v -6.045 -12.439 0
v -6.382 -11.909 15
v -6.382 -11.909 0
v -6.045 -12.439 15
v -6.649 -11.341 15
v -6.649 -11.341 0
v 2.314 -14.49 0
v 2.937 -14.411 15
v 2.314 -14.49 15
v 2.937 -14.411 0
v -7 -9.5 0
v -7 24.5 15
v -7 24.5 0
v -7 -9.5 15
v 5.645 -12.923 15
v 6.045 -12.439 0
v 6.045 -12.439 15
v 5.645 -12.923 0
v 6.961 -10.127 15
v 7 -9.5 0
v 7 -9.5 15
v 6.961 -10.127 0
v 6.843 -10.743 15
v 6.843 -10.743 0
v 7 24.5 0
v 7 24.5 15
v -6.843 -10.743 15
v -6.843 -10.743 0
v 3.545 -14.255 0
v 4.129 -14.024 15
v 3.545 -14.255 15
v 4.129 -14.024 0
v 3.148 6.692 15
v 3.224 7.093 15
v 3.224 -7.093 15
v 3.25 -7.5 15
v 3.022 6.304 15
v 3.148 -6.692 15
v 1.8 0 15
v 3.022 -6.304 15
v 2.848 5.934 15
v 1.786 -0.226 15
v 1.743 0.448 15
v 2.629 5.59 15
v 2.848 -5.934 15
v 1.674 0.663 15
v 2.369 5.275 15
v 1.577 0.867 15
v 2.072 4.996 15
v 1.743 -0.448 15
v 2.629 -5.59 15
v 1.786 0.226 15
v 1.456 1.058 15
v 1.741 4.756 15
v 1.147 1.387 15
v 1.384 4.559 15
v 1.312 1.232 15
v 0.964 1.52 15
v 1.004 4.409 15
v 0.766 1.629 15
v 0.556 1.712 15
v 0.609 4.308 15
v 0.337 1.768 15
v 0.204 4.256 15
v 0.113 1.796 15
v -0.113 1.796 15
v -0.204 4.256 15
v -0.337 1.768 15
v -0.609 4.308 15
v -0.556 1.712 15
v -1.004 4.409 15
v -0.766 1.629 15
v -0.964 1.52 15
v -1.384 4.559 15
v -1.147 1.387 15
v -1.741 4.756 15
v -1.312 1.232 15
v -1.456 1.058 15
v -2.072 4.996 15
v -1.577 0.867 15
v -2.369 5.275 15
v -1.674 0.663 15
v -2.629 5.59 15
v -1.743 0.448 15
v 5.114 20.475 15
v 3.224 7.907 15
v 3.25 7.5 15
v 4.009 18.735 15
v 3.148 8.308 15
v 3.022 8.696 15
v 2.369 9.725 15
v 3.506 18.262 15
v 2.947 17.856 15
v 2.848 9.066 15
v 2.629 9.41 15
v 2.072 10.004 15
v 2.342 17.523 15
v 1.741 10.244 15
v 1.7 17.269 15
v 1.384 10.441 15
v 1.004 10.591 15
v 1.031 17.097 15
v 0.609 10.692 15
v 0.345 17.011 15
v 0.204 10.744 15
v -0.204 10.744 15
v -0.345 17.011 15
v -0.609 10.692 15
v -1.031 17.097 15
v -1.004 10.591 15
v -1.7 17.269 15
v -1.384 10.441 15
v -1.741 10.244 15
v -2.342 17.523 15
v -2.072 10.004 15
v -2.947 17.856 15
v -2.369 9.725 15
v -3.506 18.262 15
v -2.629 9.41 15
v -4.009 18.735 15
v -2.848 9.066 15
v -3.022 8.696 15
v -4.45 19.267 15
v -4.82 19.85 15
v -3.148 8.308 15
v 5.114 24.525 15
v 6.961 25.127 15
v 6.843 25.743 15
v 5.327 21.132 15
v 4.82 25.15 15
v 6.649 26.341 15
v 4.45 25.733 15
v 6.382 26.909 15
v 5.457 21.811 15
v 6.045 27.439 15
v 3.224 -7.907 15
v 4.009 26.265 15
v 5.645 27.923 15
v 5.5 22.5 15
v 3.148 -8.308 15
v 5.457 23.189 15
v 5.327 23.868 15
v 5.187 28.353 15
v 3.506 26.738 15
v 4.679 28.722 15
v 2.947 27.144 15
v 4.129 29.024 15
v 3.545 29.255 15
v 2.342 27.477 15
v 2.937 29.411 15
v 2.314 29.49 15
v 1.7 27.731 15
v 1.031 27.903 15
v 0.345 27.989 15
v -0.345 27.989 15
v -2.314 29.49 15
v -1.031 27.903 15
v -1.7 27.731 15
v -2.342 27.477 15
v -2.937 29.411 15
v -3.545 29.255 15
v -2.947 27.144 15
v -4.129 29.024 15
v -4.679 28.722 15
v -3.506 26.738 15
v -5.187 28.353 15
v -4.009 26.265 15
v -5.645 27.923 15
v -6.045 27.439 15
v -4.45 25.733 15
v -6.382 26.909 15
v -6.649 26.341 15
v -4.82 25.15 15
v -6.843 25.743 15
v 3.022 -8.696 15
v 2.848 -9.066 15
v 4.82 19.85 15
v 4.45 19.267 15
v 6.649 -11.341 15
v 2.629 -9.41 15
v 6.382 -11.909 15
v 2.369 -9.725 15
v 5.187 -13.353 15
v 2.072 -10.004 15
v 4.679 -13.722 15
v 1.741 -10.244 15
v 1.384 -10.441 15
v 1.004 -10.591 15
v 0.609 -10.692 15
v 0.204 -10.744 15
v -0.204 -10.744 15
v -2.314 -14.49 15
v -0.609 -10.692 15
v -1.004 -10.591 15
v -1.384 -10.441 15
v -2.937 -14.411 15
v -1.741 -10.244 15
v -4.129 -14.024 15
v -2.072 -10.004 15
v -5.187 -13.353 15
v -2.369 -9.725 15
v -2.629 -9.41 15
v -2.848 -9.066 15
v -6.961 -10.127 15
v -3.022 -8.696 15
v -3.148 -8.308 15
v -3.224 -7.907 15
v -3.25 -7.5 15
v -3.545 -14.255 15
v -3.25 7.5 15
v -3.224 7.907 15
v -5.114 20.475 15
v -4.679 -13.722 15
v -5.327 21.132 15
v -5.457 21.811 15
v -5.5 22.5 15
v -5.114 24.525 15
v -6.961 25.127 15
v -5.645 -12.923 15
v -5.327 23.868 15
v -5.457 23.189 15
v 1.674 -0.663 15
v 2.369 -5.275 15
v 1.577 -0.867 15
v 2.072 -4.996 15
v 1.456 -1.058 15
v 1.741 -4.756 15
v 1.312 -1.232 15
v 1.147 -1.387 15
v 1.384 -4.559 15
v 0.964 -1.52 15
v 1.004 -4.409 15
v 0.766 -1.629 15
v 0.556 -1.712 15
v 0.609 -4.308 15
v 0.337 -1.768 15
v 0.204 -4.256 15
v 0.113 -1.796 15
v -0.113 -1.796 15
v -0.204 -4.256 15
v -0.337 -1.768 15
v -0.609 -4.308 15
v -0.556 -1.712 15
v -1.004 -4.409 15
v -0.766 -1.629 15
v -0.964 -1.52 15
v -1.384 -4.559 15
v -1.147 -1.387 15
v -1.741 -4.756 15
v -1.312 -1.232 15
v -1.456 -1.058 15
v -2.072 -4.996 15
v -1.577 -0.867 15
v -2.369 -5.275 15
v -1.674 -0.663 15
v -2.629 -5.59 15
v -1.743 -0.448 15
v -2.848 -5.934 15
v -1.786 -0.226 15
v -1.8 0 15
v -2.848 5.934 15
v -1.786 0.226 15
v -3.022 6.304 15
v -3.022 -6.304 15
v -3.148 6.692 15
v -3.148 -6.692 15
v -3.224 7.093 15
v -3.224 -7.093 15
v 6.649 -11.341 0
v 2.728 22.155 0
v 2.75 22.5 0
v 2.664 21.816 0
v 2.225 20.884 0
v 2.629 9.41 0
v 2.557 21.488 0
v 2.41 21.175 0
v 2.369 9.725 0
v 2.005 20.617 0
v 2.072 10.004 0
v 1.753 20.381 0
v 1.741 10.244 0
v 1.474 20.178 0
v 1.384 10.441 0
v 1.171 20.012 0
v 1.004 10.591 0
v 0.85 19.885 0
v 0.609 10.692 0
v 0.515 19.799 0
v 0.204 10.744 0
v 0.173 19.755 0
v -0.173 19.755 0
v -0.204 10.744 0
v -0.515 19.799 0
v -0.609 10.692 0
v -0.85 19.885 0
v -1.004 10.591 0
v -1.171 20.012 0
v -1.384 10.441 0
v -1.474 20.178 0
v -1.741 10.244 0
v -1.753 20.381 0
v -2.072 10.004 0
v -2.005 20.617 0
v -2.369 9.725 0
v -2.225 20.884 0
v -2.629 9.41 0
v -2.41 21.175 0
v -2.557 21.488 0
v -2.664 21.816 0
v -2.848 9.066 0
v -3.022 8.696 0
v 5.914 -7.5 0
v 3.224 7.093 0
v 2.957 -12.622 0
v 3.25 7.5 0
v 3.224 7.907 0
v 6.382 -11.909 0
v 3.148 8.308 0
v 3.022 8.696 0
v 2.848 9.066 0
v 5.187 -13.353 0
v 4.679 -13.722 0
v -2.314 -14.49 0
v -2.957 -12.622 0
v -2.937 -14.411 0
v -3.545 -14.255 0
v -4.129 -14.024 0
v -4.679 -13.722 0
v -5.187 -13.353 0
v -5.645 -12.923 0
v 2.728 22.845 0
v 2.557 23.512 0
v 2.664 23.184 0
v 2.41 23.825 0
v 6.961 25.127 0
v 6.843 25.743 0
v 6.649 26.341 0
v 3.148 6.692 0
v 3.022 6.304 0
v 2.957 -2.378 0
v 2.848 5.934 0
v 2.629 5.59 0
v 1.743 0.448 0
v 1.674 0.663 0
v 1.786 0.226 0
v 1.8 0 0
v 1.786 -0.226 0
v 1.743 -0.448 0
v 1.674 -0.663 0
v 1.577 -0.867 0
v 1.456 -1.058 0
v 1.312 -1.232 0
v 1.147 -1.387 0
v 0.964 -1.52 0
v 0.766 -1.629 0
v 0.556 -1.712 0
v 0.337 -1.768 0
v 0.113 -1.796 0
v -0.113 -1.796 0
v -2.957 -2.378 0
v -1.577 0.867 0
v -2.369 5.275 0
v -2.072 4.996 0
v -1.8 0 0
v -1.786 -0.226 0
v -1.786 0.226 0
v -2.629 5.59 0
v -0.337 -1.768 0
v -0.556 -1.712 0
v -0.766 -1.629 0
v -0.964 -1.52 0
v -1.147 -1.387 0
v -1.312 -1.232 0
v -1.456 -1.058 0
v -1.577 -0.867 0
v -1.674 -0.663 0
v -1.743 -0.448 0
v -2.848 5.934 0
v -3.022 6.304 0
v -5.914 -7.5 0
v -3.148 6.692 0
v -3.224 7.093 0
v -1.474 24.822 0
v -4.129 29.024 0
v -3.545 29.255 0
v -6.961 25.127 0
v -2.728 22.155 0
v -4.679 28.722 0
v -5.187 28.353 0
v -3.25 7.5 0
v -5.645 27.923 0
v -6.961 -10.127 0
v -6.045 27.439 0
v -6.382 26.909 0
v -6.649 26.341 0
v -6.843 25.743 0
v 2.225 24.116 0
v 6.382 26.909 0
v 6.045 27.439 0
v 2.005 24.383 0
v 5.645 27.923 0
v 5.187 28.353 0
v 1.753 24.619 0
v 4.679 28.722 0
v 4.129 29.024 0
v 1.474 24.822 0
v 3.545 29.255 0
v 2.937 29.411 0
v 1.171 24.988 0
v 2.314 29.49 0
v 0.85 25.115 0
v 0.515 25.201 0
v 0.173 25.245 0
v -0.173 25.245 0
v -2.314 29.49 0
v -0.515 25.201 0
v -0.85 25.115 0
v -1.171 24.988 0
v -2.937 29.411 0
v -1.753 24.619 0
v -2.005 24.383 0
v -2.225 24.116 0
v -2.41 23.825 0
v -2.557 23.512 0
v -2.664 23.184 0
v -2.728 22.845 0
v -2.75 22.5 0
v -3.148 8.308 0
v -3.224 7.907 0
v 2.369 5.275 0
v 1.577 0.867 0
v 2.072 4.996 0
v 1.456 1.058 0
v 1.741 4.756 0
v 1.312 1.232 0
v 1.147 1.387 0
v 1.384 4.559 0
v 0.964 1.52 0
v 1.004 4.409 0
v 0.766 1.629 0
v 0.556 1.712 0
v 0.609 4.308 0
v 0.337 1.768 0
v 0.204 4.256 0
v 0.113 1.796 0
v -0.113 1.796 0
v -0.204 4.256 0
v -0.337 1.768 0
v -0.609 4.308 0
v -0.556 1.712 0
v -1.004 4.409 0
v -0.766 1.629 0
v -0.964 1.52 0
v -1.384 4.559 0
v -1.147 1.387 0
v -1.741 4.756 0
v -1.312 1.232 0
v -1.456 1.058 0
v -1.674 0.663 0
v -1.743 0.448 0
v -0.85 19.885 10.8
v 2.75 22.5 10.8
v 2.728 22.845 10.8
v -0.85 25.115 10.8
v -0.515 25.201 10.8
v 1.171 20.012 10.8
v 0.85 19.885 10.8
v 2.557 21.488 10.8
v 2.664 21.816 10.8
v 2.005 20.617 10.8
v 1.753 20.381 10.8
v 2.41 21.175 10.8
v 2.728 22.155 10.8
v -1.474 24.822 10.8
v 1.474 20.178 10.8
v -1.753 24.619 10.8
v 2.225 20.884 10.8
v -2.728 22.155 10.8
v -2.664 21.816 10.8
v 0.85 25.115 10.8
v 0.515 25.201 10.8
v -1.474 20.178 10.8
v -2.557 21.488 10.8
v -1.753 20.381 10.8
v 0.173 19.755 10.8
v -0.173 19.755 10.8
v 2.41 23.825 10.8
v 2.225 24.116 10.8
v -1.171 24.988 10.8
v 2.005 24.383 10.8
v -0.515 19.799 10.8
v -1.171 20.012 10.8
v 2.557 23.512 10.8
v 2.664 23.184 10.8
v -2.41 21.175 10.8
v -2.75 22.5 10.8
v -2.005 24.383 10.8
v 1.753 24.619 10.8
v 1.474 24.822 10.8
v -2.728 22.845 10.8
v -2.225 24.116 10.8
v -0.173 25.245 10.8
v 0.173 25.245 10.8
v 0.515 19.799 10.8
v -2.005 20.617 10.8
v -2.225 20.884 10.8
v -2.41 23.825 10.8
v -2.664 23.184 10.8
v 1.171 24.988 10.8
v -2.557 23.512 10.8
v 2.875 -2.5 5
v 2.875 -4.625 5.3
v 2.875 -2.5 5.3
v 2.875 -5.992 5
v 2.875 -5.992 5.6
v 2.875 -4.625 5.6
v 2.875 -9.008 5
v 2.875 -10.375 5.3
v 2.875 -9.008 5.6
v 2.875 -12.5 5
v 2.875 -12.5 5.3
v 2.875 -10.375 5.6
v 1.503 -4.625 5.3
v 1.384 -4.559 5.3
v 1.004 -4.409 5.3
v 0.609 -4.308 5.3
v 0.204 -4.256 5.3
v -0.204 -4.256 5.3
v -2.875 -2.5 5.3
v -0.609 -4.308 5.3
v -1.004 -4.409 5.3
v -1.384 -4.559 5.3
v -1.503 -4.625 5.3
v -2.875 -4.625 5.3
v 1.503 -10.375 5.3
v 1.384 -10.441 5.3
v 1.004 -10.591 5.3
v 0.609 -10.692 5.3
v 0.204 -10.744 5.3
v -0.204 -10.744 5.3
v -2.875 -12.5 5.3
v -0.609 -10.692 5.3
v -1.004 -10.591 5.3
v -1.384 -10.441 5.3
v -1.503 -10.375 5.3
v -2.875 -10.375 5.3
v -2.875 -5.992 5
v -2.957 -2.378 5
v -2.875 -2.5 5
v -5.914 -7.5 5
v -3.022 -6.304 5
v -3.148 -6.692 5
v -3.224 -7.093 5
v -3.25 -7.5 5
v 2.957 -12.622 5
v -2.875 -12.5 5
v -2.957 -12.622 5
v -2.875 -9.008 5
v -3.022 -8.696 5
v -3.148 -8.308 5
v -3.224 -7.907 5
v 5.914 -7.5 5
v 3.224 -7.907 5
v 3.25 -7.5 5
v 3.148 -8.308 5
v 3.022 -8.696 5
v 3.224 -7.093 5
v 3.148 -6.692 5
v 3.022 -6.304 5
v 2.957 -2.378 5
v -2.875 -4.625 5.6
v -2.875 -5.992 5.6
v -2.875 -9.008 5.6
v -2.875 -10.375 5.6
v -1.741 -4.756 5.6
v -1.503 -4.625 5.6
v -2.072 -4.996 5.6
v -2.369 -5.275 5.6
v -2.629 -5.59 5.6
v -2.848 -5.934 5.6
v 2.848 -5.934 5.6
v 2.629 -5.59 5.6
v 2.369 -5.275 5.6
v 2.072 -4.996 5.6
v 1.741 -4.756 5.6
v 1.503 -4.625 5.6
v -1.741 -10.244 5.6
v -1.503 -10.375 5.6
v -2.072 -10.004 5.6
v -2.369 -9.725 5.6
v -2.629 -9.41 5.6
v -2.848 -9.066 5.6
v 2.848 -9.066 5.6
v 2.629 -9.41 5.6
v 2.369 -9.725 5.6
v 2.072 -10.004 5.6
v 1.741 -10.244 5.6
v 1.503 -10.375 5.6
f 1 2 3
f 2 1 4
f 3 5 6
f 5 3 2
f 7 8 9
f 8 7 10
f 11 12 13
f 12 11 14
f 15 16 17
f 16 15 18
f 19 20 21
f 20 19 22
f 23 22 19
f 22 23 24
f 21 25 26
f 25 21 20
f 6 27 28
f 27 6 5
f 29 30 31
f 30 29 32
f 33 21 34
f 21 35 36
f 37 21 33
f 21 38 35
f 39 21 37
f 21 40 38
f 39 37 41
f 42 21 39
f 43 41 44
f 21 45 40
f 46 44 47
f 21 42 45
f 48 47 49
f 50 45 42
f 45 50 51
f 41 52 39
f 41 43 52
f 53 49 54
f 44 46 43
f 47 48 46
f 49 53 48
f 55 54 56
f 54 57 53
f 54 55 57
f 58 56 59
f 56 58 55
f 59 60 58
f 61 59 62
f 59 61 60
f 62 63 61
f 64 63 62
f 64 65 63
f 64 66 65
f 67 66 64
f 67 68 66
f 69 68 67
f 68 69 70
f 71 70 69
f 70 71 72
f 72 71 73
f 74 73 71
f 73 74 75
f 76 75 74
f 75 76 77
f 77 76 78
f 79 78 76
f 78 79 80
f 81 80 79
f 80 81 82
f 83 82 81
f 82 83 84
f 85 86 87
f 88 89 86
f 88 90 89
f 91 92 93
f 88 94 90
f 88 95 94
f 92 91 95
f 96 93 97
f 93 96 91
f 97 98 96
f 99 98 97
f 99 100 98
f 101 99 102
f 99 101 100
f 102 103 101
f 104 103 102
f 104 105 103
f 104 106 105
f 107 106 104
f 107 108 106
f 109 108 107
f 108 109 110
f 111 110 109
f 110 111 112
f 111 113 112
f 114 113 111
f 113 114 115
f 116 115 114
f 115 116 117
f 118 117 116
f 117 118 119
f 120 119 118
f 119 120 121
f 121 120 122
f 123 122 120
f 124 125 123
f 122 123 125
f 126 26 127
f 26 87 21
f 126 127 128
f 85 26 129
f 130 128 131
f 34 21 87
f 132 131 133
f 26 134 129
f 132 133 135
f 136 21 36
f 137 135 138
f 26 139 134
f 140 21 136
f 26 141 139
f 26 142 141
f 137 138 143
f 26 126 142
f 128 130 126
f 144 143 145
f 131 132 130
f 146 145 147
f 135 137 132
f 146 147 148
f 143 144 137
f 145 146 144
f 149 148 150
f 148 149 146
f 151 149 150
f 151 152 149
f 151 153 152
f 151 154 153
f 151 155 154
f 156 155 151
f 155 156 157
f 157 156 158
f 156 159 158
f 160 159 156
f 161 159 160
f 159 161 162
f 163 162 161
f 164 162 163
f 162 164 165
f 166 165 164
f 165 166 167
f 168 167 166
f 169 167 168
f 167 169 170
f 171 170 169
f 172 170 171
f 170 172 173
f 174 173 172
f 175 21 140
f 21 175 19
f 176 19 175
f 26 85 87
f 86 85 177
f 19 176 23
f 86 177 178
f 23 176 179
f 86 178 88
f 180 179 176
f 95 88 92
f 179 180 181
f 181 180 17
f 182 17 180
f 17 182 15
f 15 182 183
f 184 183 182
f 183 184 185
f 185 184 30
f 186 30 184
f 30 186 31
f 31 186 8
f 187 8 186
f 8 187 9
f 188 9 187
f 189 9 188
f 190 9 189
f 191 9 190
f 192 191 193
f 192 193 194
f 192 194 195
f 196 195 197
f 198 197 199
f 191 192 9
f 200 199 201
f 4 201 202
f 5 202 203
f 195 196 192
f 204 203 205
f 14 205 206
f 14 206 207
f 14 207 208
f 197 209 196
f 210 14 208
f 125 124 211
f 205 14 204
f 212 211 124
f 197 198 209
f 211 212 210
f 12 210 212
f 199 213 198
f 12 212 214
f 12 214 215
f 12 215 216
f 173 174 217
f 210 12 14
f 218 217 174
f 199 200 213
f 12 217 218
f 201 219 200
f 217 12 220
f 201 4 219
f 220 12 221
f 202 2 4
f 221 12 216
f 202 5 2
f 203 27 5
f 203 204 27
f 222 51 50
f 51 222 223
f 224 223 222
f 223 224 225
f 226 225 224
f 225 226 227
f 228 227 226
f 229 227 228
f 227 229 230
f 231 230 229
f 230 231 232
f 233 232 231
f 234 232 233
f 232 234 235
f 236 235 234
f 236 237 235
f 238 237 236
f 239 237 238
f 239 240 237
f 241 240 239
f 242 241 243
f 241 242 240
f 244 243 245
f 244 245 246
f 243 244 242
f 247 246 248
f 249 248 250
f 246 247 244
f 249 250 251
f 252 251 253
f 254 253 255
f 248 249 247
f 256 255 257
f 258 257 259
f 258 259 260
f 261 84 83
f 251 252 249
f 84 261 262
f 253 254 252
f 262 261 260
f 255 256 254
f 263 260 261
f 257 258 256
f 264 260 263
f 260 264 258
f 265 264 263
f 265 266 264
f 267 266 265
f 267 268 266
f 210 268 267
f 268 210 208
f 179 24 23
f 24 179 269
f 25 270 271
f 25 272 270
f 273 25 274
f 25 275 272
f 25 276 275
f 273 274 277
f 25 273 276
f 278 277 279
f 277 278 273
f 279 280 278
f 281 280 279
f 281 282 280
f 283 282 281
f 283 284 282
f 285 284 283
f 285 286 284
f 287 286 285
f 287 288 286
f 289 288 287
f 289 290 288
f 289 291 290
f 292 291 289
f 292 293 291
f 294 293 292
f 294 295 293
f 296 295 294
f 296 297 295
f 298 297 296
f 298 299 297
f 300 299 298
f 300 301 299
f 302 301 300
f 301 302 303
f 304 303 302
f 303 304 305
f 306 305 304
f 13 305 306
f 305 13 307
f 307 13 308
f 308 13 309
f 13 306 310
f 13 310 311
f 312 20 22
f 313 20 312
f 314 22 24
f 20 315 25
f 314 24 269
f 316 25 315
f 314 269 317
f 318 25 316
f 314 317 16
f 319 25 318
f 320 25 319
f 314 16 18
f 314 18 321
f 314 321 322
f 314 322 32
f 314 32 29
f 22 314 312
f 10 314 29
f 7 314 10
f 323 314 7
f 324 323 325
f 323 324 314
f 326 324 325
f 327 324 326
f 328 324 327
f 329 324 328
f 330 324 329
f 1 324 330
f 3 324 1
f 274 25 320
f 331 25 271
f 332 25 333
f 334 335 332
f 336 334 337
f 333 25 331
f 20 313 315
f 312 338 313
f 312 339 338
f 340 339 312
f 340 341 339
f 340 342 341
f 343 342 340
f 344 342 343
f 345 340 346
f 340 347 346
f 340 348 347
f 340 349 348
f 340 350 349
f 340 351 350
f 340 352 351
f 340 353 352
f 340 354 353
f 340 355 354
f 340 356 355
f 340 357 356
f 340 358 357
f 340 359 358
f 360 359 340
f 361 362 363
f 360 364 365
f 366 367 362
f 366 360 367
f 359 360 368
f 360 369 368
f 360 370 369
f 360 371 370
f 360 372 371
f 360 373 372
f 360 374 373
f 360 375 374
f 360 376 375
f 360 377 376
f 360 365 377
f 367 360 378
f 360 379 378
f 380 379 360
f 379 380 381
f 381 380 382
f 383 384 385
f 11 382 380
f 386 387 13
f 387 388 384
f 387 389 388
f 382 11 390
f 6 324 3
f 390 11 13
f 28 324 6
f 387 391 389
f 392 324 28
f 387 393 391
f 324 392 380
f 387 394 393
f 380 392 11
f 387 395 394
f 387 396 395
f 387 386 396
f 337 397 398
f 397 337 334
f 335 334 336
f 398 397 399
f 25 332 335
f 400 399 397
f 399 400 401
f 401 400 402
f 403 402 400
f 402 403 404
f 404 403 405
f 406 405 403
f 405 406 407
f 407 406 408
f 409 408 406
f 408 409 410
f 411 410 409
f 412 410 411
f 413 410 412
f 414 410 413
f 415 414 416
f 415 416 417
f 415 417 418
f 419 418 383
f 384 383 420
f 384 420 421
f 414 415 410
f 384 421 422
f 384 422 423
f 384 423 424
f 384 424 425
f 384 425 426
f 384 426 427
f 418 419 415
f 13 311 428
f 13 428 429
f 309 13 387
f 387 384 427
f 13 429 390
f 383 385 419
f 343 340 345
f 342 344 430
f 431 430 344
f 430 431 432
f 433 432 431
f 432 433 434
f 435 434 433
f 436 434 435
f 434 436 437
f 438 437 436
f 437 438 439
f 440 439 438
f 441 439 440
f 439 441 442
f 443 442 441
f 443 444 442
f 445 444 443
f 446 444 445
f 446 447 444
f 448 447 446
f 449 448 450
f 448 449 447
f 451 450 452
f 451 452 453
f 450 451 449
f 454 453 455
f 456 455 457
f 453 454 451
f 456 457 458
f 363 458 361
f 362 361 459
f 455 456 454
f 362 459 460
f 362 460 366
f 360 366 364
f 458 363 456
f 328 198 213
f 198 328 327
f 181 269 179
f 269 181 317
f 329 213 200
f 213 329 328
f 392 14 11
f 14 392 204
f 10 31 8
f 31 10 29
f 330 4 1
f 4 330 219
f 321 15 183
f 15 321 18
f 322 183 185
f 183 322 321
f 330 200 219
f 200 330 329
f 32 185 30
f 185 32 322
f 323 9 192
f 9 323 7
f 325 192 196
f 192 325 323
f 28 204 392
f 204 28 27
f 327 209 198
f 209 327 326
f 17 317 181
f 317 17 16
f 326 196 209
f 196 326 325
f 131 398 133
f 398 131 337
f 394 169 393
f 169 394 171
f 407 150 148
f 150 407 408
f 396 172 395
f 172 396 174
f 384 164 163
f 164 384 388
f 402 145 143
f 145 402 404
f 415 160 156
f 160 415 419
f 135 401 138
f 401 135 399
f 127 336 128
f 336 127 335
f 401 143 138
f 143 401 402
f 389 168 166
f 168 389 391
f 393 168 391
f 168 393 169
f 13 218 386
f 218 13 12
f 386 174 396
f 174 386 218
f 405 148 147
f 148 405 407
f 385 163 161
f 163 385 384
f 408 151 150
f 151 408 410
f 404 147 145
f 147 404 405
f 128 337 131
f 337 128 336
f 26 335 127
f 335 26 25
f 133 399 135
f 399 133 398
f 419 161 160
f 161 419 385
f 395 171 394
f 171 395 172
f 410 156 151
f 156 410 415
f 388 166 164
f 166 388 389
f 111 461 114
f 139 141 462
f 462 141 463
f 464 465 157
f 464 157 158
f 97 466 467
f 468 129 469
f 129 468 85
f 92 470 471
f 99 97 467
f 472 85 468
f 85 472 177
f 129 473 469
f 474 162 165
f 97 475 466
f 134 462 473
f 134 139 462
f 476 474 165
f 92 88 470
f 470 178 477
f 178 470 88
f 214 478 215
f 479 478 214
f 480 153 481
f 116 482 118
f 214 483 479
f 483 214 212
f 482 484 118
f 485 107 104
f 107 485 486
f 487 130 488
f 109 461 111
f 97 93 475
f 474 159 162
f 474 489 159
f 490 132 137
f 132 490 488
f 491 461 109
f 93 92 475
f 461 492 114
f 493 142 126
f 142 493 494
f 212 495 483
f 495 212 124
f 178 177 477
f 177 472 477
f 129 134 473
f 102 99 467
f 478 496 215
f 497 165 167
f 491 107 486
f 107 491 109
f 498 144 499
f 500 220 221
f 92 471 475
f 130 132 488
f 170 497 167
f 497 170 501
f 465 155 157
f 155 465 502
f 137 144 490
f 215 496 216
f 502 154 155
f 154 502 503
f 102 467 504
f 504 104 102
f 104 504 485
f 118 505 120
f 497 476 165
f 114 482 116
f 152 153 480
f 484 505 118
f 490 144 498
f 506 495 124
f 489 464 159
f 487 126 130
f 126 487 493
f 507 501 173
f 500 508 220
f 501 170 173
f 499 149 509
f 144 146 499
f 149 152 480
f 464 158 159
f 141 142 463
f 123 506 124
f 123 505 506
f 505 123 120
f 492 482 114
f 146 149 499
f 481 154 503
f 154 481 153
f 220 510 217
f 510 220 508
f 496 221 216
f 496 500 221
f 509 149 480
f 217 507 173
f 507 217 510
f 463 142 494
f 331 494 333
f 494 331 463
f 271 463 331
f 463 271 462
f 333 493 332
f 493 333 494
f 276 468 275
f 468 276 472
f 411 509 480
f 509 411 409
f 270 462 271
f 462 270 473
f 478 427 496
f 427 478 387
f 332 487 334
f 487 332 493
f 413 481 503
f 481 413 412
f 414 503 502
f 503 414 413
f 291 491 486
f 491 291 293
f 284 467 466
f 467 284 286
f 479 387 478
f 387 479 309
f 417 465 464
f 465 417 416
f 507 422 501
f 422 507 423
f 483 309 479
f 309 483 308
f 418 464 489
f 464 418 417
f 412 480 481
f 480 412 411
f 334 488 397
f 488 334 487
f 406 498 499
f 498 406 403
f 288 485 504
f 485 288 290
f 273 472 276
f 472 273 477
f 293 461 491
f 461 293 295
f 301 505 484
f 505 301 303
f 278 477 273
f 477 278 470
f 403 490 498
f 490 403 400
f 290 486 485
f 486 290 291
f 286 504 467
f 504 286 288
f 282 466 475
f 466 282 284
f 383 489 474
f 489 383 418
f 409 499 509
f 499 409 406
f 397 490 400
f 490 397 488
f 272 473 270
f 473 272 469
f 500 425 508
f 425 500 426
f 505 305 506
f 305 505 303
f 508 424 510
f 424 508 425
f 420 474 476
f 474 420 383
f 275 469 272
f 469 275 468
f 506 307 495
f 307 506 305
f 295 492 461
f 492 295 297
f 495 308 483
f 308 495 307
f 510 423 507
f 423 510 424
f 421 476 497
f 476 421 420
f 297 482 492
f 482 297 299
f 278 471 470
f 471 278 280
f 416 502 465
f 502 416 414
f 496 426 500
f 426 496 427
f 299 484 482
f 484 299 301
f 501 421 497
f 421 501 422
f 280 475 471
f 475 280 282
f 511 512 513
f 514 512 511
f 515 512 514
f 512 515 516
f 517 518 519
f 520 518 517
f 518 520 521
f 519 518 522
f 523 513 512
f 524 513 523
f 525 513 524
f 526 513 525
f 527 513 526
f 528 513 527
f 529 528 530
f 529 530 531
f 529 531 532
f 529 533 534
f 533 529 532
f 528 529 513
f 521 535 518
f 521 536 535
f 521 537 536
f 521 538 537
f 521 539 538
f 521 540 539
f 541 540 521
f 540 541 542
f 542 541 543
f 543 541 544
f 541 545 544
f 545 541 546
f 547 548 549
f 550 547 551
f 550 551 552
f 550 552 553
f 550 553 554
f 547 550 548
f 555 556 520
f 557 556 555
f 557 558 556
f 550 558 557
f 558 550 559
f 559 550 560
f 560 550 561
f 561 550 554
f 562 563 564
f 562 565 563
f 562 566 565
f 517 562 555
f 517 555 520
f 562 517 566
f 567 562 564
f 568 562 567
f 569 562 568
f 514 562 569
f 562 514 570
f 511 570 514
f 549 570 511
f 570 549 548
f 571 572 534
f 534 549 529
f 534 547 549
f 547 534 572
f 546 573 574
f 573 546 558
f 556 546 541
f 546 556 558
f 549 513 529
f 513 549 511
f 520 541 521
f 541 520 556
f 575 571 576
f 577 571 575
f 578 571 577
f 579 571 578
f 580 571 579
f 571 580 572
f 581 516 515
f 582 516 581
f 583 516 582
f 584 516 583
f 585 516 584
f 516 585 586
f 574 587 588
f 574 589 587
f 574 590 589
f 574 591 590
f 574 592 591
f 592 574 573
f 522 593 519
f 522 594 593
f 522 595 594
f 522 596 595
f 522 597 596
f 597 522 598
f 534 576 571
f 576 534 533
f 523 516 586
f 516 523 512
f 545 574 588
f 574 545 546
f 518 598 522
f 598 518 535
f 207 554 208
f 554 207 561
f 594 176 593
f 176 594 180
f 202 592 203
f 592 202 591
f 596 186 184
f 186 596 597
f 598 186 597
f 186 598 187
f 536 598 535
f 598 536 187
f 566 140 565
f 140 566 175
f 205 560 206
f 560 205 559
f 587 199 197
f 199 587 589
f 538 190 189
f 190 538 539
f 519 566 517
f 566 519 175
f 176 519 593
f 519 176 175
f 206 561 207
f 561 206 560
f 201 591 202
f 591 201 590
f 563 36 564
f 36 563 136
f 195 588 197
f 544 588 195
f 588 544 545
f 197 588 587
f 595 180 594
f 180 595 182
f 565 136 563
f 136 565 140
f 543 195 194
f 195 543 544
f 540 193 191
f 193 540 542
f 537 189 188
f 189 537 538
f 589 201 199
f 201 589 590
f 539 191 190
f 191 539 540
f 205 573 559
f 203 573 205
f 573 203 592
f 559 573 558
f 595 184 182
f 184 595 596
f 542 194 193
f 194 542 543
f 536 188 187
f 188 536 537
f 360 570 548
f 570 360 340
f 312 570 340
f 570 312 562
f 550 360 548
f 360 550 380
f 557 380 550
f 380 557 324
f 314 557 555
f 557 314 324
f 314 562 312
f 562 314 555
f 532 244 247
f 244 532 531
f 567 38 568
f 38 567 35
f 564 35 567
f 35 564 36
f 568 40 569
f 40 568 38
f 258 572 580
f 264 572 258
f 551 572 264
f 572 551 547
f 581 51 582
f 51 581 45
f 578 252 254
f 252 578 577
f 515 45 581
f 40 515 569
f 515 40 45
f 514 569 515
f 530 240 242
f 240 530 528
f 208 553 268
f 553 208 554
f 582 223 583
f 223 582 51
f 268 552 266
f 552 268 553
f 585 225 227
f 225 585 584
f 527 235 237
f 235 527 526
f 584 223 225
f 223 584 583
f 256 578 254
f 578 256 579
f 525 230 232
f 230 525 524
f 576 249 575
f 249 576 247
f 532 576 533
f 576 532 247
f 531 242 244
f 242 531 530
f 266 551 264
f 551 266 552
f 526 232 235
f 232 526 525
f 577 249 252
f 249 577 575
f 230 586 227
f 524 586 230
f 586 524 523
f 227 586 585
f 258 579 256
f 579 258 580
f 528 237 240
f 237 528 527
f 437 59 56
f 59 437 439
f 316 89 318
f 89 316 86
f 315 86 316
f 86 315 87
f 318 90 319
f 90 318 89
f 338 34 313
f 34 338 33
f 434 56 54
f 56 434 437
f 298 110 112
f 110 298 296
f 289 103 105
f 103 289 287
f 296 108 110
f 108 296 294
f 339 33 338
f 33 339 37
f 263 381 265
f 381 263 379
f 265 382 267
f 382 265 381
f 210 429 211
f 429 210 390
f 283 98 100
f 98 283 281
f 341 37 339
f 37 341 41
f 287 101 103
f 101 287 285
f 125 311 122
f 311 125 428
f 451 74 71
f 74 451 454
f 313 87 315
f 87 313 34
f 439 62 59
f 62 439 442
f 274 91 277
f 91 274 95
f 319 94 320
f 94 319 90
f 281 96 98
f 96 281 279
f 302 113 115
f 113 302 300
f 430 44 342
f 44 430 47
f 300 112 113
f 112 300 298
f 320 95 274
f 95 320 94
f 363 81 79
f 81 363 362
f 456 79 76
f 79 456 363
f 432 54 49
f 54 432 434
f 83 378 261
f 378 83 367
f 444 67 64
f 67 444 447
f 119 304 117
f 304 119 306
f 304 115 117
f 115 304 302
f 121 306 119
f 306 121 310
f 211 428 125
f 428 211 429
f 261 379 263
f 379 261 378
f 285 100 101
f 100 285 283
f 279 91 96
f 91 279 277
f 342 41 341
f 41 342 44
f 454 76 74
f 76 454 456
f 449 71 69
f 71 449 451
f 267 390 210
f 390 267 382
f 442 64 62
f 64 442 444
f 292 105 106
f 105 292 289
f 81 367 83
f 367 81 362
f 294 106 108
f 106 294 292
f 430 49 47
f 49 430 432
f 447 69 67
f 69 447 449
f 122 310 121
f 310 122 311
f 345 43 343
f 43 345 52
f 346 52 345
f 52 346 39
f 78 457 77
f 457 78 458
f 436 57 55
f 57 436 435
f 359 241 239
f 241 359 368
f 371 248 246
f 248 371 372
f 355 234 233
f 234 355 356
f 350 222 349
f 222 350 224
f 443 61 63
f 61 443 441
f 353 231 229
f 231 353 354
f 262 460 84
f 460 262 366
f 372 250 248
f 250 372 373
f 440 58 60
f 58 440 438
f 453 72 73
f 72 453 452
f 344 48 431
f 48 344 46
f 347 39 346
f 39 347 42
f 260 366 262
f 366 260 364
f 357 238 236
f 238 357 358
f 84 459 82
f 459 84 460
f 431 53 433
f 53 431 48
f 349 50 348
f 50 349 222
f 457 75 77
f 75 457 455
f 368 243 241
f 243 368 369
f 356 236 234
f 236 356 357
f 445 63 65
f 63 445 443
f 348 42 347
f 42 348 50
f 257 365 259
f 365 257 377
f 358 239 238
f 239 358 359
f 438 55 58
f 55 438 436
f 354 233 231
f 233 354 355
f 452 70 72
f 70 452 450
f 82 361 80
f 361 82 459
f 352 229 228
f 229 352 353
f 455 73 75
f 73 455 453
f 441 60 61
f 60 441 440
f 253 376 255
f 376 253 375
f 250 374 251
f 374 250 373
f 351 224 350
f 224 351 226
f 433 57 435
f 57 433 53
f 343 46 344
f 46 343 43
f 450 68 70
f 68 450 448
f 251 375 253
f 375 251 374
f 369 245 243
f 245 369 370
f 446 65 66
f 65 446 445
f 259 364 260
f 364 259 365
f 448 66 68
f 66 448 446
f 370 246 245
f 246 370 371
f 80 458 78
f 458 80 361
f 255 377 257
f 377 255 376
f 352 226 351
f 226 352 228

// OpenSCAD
$fn = 50;


difference() {
	union() {
		hull() {
			translate(v = [-2.0000000000, 9.5000000000, 0]) {
				cylinder(h = 15, r = 5);
			}
			translate(v = [2.0000000000, 9.5000000000, 0]) {
				cylinder(h = 15, r = 5);
			}
			translate(v = [-2.0000000000, -9.5000000000, 0]) {
				cylinder(h = 15, r = 5);
			}
			translate(v = [2.0000000000, -9.5000000000, 0]) {
				cylinder(h = 15, r = 5);
			}
		}
		translate(v = [0.0000000000, 15.0000000000, 0]) {
			hull() {
				translate(v = [-2.0000000000, 9.5000000000, 0]) {
					cylinder(h = 15, r = 5);
				}
				translate(v = [2.0000000000, 9.5000000000, 0]) {
					cylinder(h = 15, r = 5);
				}
				translate(v = [-2.0000000000, -9.5000000000, 0]) {
					cylinder(h = 15, r = 5);
				}
				translate(v = [2.0000000000, -9.5000000000, 0]) {
					cylinder(h = 15, r = 5);
				}
			}
		}
		translate(v = [0.0000000000, 15.0000000000, 0]) {
			hull() {
				translate(v = [-2.0000000000, 9.5000000000, 0]) {
					cylinder(h = 15, r = 5);
				}
				translate(v = [2.0000000000, 9.5000000000, 0]) {
					cylinder(h = 15, r = 5);
				}
				translate(v = [-2.0000000000, -9.5000000000, 0]) {
					cylinder(h = 15, r = 5);
				}
				translate(v = [2.0000000000, -9.5000000000, 0]) {
					cylinder(h = 15, r = 5);
				}
			}
		}
	}
	union() {
		translate(v = [0.0000000000, 22.5000000000, 15]) {
			rotate(a = [0, 0, 0]) {
				difference() {
					union() {
						#translate(v = [0, 0, -15.0000000000]) {
							cylinder(h = 15, r = 2.2500000000);
						}
						#translate(v = [0, 0, -4.2000000000]) {
							cylinder(h = 4.2000000000, r1 = 2.7500000000, r2 = 5.5000000000);
						}
						#translate(v = [0, 0, -15.0000000000]) {
							cylinder(h = 15, r = 2.7500000000);
						}
						#translate(v = [0, 0, -15.0000000000]) {
							cylinder(h = 15, r = 2.2500000000);
						}
					}
					union();
				}
			}
		}
		translate(v = [0.0000000000, 22.5000000000, 15]) {
			rotate(a = [0, 0, 0]) {
				difference() {
					union() {
						#translate(v = [0, 0, -15.0000000000]) {
							cylinder(h = 15, r = 2.2500000000);
						}
						#translate(v = [0, 0, -4.2000000000]) {
							cylinder(h = 4.2000000000, r1 = 2.7500000000, r2 = 5.5000000000);
						}
						#translate(v = [0, 0, -15.0000000000]) {
							cylinder(h = 15, r = 2.7500000000);
						}
						#translate(v = [0, 0, -15.0000000000]) {
							cylinder(h = 15, r = 2.2500000000);
						}
					}
					union();
				}
			}
		}
		translate(v = [0.0000000000, -7.5000000000, 0]) {
			rotate(a = [0, 0, 0]) {
				difference() {
					union() {
						#translate(v = [-2.8750000000, -5.0000000000, -0.3000000000]) {
							cube(size = [5.7500000000, 10, 0.3000000000]);
						}
						#translate(v = [-2.8750000000, -2.8750000000, -0.6000000000]) {
							cube(size = [5.7500000000, 5.7500000000, 0.3000000000]);
						}
						#translate(v = [-2.8750000000, -5.0000000000, 5]) {
							cube(size = [5.7500000000, 10, 0.3000000000]);
						}
						#translate(v = [-2.8750000000, -2.8750000000, 5.3000000000]) {
							cube(size = [5.7500000000, 5.7500000000, 0.3000000000]);
						}
						#translate(v = [0, 0, -100.0000000000]) {
							cylinder(h = 200, r = 3.2500000000);
						}
						#linear_extrude(height = 5) {
							polygon(points = [[5.9142500000, 0.0000000000], [2.9571250000, 5.1218907443], [-2.9571250000, 5.1218907443], [-5.9142500000, 0.0000000000], [-2.9571250000, -5.1218907443], [2.9571250000, -5.1218907443]]);
						}
						#translate(v = [-2.8750000000, -5.0000000000, -0.3000000000]) {
							cube(size = [5.7500000000, 10, 0.3000000000]);
						}
						#translate(v = [-2.8750000000, -2.8750000000, -0.6000000000]) {
							cube(size = [5.7500000000, 5.7500000000, 0.3000000000]);
						}
						#translate(v = [-2.8750000000, -5.0000000000, 5]) {
							cube(size = [5.7500000000, 10, 0.3000000000]);
						}
						#translate(v = [-2.8750000000, -2.8750000000, 5.3000000000]) {
							cube(size = [5.7500000000, 5.7500000000, 0.3000000000]);
						}
						#translate(v = [0, 0, -100.0000000000]) {
							cylinder(h = 200, r = 3.2500000000);
						}
						#translate(v = [-2.8750000000, -5.0000000000, -0.3000000000]) {
							cube(size = [5.7500000000, 10, 0.3000000000]);
						}
						#translate(v = [-2.8750000000, -2.8750000000, -0.6000000000]) {
							cube(size = [5.7500000000, 5.7500000000, 0.3000000000]);
						}
						#translate(v = [-2.8750000000, -5.0000000000, 5]) {
							cube(size = [5.7500000000, 10, 0.3000000000]);
						}
						#translate(v = [-2.8750000000, -2.8750000000, 5.3000000000]) {
							cube(size = [5.7500000000, 5.7500000000, 0.3000000000]);
						}
						#translate(v = [0, 0, -100.0000000000]) {
							cylinder(h = 200, r = 3.2500000000);
						}
					}
					union();
				}
			}
		}
		translate(v = [0.0000000000, -7.5000000000, 0]) {
			translate(v = [0, 0, -100]) {
				cylinder(h = 200, r = 3.2500000000);
			}
		}
		translate(v = [0.0000000000, 7.5000000000, 0]) {
			translate(v = [0, 0, -100]) {
				cylinder(h = 200, r = 3.2500000000);
			}
		}
		translate(v = [0.0000000000, -7.5000000000, 0]) {
			translate(v = [0, 0, -100]) {
				cylinder(h = 200, r = 1.8000000000);
			}
		}
		translate(v = [0, 0, -100]) {
			cylinder(h = 200, r = 1.8000000000);
		}
		translate(v = [0.0000000000, 7.5000000000, 0]) {
			translate(v = [0, 0, -100]) {
				cylinder(h = 200, r = 1.8000000000);
			}
		}
	}
}
